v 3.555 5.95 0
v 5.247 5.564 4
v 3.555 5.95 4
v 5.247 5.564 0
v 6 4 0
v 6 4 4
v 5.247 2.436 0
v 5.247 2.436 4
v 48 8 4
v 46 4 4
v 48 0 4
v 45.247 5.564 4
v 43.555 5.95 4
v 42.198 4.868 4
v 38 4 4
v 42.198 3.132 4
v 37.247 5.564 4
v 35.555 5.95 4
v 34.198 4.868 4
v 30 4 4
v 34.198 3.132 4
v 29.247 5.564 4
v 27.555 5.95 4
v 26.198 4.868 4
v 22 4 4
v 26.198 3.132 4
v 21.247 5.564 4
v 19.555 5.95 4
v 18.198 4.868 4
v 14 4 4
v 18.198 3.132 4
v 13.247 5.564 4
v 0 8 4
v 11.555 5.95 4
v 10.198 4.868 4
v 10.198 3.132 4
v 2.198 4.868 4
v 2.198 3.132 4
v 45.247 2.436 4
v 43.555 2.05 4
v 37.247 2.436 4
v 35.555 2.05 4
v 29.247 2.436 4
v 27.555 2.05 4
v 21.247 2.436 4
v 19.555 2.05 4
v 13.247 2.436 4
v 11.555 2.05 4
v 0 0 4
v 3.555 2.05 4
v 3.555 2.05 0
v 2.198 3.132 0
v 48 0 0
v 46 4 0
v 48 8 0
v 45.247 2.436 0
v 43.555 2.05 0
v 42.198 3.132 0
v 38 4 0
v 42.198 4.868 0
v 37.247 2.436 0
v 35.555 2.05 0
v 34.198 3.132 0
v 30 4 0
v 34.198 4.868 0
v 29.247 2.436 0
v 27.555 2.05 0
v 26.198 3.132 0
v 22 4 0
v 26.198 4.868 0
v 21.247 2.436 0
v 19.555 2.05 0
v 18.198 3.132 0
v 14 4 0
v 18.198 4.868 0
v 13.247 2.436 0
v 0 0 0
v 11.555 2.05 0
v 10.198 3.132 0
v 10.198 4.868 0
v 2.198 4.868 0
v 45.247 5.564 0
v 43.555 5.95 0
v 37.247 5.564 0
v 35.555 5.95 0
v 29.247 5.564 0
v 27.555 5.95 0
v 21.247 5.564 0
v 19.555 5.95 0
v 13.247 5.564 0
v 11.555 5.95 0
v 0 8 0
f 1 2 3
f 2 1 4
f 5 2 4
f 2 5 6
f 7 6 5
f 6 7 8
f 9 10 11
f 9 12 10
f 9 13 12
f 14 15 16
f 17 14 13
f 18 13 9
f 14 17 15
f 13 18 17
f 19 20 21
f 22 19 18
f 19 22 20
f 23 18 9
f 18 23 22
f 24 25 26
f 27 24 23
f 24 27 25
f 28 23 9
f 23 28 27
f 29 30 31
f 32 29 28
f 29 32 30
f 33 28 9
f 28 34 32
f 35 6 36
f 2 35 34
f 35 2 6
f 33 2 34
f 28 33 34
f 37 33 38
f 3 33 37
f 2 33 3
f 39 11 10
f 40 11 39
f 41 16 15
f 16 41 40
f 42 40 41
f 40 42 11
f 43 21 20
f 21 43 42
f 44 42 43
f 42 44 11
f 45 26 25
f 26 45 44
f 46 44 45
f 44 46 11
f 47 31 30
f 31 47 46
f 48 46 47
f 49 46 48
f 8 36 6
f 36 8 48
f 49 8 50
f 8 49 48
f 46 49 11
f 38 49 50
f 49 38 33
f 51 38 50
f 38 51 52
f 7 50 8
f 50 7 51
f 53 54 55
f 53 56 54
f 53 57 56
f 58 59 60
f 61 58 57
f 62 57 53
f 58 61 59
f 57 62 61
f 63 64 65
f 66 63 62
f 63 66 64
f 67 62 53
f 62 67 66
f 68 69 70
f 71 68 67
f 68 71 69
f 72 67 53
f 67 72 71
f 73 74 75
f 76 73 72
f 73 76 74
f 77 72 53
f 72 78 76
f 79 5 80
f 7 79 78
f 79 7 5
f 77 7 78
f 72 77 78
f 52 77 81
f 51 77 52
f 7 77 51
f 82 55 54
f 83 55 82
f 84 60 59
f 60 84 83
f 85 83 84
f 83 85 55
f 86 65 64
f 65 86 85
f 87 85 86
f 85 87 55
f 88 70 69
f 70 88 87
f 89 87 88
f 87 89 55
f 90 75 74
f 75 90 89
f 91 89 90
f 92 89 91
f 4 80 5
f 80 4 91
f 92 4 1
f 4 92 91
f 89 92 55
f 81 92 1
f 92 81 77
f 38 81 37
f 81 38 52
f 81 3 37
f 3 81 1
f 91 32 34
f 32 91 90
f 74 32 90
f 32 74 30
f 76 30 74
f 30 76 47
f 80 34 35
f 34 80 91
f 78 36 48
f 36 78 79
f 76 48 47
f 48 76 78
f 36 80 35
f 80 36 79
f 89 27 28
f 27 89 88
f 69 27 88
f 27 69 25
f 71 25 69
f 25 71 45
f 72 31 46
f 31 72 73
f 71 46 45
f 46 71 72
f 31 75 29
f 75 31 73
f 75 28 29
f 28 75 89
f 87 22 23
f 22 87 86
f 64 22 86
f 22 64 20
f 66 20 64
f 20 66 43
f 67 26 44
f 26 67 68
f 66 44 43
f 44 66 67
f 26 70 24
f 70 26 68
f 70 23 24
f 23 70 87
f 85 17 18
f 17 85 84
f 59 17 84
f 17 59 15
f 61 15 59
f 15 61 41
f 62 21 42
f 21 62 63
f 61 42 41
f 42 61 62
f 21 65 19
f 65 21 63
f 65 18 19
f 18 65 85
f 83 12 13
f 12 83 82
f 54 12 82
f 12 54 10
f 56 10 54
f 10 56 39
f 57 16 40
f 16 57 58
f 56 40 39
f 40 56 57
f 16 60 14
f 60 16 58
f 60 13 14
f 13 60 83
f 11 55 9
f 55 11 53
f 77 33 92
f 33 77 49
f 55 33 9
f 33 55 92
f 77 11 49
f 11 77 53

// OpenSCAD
rangees_longueur = 6;
rangees_largeur =1;
difference(){
cube([rangees_longueur*8, rangees_largeur*8,4]);

union(){
for(i = [0:rangees_longueur]){
    for(j=[0: rangees_largeur]){
        translate([4+i*8, 4+j*8, 0]){
            cylinder(h=4, r= 2);
            }
        }
    }
}
}
